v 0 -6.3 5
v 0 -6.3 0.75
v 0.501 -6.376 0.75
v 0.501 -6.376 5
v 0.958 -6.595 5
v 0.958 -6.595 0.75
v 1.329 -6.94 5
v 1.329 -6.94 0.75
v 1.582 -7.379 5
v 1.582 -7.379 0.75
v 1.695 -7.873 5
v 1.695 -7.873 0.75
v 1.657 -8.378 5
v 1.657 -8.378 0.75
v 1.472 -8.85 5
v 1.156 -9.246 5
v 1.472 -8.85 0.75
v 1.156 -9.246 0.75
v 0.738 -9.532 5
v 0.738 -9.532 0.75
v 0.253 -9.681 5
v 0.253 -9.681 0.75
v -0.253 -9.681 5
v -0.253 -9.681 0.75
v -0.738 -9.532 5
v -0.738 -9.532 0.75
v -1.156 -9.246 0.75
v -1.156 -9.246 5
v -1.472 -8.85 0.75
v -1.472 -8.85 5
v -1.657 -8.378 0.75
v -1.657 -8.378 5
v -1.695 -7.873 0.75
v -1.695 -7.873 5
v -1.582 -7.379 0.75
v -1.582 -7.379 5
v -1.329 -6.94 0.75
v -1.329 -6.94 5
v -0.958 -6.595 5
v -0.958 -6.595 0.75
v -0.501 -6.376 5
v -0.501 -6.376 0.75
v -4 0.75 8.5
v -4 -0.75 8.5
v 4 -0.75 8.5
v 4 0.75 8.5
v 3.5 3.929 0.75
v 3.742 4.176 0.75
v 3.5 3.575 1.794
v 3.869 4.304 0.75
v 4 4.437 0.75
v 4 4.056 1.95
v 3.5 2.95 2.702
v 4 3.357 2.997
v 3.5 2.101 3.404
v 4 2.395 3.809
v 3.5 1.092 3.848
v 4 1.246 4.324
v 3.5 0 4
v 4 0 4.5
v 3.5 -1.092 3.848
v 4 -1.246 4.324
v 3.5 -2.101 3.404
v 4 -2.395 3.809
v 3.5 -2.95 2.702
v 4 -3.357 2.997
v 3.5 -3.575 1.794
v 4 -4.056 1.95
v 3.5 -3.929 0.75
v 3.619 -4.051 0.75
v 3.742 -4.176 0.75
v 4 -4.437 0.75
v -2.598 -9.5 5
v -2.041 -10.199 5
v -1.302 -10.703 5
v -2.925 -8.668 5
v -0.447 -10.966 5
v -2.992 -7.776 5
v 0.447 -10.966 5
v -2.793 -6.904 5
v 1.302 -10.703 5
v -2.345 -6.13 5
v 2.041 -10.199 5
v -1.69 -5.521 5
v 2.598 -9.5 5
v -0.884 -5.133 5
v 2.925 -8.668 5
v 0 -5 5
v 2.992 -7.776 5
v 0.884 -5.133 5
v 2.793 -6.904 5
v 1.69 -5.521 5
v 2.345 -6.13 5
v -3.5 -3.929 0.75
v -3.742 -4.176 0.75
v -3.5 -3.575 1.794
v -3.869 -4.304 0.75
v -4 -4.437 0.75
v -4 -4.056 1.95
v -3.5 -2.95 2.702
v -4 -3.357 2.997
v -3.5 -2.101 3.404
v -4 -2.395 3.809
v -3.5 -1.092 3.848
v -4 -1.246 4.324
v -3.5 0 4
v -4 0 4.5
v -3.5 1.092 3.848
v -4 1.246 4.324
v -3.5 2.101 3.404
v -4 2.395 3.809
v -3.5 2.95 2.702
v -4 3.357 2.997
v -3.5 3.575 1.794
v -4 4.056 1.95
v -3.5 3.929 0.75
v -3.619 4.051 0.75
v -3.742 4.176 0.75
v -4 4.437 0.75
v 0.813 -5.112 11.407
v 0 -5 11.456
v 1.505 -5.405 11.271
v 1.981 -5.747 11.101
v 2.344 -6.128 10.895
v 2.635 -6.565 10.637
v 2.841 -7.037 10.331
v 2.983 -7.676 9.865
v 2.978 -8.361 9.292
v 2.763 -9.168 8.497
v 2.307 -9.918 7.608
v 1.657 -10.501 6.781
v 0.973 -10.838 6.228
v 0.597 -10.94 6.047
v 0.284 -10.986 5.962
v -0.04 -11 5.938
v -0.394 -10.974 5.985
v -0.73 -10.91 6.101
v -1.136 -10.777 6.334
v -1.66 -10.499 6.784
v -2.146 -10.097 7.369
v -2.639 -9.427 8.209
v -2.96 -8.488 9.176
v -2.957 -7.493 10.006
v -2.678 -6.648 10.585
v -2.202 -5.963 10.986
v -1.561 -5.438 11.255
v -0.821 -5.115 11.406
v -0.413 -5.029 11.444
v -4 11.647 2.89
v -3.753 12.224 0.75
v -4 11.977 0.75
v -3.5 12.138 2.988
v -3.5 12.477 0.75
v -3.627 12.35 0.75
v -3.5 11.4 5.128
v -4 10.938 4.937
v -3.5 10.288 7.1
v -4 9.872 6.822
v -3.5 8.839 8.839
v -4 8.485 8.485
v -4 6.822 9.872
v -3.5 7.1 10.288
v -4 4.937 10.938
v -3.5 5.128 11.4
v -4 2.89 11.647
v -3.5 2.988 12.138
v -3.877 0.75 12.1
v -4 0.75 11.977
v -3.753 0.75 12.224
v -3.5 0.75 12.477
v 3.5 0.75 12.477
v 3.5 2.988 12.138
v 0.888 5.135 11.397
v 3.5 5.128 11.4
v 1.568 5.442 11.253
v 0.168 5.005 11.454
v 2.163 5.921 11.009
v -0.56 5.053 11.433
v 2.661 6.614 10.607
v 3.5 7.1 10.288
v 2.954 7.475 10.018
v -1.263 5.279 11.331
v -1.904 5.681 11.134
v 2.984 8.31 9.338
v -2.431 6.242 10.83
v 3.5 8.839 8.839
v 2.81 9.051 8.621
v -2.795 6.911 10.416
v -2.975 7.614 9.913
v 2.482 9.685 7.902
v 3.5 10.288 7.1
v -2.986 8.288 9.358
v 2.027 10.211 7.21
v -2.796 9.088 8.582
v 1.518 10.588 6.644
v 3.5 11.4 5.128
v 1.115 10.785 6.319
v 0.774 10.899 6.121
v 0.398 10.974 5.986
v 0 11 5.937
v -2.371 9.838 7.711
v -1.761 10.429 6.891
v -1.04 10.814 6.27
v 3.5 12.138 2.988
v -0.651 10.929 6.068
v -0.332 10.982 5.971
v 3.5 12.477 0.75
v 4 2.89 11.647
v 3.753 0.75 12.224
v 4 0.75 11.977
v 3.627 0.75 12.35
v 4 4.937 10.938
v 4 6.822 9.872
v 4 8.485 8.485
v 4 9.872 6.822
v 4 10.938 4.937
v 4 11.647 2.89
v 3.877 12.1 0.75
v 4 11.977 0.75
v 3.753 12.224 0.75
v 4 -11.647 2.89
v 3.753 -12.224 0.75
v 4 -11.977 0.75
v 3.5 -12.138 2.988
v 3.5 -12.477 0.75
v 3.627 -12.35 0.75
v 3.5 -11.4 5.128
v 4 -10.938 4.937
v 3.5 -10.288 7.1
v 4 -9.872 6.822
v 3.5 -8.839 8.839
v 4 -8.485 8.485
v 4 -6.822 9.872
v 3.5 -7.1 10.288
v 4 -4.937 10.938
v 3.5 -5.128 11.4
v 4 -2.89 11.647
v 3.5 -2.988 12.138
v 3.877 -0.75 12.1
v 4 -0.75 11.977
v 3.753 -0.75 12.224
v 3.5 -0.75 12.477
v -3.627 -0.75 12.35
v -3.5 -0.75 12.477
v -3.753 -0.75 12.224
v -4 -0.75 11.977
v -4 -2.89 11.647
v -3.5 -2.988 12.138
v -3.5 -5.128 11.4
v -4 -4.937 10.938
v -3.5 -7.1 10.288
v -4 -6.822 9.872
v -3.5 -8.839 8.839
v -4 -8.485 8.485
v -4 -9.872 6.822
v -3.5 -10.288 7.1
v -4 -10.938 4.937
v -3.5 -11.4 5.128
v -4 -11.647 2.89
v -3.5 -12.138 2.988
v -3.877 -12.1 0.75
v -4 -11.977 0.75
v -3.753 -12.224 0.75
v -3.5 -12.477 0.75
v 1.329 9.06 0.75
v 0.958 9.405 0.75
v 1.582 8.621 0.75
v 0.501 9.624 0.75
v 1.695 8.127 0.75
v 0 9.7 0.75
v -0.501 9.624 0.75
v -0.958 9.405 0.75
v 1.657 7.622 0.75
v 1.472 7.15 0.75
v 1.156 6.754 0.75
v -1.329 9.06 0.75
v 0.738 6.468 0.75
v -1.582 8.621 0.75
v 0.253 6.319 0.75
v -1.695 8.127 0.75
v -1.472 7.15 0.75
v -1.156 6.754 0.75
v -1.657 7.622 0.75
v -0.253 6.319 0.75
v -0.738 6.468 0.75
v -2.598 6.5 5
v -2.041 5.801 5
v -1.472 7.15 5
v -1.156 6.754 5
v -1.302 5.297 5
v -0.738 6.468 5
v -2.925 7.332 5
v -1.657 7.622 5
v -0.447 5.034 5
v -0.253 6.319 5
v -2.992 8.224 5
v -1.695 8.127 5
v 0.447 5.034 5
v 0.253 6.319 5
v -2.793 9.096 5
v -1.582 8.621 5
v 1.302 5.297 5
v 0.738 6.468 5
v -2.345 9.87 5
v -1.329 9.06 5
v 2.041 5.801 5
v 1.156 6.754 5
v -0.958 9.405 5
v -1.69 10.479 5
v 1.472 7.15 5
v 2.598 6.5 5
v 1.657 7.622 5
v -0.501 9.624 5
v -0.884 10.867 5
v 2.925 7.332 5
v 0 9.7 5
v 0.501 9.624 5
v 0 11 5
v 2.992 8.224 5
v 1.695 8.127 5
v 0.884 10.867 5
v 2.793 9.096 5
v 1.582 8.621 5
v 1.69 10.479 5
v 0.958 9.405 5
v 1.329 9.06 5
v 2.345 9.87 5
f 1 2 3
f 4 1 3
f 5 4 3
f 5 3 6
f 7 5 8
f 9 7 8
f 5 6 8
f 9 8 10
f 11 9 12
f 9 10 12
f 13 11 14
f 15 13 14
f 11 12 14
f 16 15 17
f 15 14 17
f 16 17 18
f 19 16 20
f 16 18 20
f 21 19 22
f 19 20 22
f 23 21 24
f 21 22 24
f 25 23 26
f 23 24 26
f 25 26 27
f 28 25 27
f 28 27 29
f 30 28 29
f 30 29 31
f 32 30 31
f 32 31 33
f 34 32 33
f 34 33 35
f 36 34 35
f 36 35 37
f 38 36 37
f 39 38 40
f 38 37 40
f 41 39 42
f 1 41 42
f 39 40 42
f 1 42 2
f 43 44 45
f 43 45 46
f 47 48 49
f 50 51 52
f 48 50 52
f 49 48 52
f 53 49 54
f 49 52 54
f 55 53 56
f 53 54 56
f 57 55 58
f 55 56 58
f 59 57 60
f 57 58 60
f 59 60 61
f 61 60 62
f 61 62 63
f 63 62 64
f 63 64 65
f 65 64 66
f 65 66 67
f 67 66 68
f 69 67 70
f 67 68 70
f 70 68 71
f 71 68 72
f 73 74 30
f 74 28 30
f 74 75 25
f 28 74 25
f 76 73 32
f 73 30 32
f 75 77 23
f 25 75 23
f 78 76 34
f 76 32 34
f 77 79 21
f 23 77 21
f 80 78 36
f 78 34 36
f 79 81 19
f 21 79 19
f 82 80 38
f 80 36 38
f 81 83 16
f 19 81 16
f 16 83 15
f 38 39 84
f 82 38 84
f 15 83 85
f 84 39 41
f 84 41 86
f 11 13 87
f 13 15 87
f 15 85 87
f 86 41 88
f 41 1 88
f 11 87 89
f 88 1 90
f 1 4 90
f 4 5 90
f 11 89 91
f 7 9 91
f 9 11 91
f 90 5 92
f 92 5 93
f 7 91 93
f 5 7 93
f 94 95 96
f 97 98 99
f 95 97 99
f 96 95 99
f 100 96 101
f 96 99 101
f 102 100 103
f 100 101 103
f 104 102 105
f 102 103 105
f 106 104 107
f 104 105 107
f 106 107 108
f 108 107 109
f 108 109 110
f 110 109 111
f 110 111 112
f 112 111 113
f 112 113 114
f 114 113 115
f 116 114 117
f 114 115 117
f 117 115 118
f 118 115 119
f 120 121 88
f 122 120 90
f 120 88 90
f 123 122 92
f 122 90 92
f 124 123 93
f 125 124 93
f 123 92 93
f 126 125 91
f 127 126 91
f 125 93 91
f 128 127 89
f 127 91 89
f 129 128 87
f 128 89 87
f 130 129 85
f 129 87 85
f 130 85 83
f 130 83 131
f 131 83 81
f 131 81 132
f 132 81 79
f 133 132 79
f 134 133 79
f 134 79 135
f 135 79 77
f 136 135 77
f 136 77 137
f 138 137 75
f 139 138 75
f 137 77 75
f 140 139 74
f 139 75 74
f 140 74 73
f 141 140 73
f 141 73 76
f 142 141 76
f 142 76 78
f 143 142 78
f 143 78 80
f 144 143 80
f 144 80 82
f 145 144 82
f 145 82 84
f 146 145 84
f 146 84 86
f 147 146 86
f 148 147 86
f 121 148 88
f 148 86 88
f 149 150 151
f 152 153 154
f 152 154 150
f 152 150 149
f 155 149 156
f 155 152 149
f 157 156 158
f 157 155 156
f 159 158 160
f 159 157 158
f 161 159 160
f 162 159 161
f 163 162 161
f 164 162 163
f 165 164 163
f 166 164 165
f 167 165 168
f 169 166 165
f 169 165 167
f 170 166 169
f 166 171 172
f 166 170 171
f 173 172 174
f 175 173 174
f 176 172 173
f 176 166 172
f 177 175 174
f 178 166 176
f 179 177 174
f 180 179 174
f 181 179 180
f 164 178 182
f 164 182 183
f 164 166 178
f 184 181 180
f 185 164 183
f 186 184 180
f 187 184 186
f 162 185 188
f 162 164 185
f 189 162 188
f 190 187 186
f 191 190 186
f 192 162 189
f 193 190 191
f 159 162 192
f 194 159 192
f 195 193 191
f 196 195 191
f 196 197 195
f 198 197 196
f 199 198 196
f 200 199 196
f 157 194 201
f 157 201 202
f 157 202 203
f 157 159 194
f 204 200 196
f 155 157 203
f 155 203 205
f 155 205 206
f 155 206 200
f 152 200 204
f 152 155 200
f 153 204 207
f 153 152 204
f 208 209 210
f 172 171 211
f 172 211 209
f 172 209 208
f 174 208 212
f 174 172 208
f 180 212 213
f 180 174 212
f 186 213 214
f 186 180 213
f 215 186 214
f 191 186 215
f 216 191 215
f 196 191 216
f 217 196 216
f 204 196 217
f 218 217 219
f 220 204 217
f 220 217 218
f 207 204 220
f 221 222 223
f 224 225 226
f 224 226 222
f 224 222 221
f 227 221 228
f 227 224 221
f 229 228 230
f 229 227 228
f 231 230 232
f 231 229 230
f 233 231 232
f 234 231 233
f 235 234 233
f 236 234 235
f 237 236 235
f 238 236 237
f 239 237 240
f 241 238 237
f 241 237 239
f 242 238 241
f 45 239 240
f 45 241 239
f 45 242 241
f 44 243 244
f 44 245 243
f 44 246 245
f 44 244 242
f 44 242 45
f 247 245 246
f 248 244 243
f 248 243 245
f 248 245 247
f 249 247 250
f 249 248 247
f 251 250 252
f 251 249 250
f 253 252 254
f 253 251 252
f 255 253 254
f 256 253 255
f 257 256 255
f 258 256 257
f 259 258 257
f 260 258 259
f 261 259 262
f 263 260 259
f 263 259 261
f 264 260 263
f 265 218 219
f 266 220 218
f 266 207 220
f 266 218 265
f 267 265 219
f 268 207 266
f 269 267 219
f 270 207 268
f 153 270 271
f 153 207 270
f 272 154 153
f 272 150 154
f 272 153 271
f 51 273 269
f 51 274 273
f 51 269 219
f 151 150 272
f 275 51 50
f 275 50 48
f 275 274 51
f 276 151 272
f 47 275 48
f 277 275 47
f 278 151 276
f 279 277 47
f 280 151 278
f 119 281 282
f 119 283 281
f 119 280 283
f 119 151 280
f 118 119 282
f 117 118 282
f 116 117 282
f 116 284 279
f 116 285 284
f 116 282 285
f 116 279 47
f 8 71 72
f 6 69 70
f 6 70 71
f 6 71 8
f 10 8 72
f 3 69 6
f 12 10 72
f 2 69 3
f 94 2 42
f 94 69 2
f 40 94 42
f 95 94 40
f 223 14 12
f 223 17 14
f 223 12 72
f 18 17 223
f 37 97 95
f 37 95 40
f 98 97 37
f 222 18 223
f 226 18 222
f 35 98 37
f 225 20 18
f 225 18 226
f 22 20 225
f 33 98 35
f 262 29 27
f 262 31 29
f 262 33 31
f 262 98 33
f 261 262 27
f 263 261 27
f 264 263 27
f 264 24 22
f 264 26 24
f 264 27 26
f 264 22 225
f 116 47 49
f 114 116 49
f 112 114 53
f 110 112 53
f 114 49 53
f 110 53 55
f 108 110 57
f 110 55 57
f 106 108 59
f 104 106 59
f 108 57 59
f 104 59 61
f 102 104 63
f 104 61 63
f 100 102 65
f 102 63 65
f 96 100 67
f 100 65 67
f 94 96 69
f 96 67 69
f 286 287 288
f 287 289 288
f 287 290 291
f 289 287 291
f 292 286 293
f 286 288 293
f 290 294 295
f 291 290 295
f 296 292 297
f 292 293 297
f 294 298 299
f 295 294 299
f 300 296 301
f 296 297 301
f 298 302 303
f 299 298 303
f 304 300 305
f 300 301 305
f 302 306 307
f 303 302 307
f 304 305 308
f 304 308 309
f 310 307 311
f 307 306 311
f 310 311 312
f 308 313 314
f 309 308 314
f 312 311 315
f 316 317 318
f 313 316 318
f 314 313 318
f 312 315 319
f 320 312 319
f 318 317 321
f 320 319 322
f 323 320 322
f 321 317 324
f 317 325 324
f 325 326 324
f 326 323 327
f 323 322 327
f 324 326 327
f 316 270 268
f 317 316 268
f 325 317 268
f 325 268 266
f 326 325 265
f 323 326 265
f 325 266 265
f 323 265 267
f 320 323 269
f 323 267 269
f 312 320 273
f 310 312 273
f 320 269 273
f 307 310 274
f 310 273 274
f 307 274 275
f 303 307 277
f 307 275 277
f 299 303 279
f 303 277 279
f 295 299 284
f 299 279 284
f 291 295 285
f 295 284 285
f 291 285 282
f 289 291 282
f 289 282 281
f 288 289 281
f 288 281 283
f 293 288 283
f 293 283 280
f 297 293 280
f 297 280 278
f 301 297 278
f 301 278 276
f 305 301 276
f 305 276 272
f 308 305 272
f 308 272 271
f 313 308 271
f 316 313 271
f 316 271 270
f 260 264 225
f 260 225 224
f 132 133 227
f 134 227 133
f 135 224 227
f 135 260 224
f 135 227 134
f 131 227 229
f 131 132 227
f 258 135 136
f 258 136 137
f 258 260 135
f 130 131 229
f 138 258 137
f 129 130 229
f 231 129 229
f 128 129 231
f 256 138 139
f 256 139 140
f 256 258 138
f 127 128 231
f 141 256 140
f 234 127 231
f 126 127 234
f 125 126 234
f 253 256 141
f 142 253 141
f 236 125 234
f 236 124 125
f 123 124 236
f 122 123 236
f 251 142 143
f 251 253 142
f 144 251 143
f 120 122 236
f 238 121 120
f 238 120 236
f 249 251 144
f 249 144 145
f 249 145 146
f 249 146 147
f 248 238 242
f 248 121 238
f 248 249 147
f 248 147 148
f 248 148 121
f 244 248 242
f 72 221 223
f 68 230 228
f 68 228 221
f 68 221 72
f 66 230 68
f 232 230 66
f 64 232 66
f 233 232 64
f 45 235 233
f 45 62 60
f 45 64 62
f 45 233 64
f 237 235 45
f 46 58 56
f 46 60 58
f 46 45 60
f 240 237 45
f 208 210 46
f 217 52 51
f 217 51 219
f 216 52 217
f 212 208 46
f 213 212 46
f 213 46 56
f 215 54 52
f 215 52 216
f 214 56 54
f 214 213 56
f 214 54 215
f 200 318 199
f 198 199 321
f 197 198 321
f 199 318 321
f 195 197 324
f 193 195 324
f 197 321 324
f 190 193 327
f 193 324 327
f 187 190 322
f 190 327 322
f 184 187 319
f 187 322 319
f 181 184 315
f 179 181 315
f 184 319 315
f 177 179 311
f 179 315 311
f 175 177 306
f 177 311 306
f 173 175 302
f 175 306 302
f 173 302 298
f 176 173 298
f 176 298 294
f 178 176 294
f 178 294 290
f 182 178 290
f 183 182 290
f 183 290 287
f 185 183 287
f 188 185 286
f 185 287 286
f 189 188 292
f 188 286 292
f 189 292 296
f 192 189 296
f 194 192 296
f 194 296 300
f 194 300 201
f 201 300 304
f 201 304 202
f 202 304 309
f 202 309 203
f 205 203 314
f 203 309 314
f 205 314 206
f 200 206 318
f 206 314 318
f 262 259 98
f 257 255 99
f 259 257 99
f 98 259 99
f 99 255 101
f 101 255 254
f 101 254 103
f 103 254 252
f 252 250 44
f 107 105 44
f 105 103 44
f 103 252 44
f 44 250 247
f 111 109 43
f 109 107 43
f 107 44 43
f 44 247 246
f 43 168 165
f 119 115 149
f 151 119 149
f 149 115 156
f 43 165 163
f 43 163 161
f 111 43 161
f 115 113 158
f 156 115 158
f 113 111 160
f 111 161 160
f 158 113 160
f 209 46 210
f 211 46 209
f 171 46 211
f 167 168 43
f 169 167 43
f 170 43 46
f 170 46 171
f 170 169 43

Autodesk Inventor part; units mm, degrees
sketch "_____1" plane through (0, 0, 0) normal (0, 0, 1) x (1, 0, 0)
  line L0 (50, 0) -> (-50, 0)
  line L1 (-4, 12) -> (-4, 4.5)
  line L2 (-4, 4.5) -> (-3.5, 4)
  line L3 (-3.5, 4) -> (3.5, 4)
  line L4 (3.5, 4) -> (4, 4.5)
  line L5 (4, 4.5) -> (4, 12)
  line L6 (4, 12) -> (3.5, 12.5)
  line L7 (3.5, 12.5) -> (-3.5, 12.5)
  line L8 (-3.5, 12.5) -> (-4, 12)
revolve "Revolution1" add sketch "_____1" angle 180 about axis through (50, 0, 0) along (1, 0, 0)
sketch "_____2" plane through (0, 0, 0) normal (1, 0, 0) x (0, 0, -1)
  line L0 (-0.75, -25) -> (0.75, -25)
  line L1 (0.75, -25) -> (0.75, 25)
  line L2 (0.75, 25) -> (-0.75, 25)
  line L3 (-0.75, 25) -> (-0.75, -25)
extrude "Extrusion1" cut sketch "_____2" along normal mid plane 16
sketch "_____3" plane through (0, 0, 0) normal (1, 0, 0) x (0, 0, -1)
  line L0 (0, 8) -> (-17.5, 8)
  line L1 (-17.5, 8) -> (-17.5, 11)
  line L2 (-17.5, 11) -> (-5, 11)
  line L3 (-5, 11) -> (-5, 9.7)
  line L4 (-5, 9.7) -> (0, 9.7)
  line L5 (0, 9.7) -> (0, 8)
  line L6 (0, 8) -> (-17.5, 8)
revolve "Revolution2" cut sketch "_____3" angle 360 about axis through (0, 8, 0) along (0, 0, -1)
pattern_linear "Rectangular Pattern1" count 2 spacing 16 along (0, -1, 0) of "Revolution2"
sketch "_____5" plane through (0, 0, 0) normal (1, 0, 0) x (0, 0, -1)
  line L0 (-12.5, -0.75) -> (-8.5, -0.75)
  line L1 (-8.5, -0.75) -> (-8.5, 0.75)
  line L2 (-8.5, 0.75) -> (-12.5, 0.75)
  line L3 (-12.5, 0.75) -> (-12.5, -0.75)
extrude "Extrusion2" cut sketch "_____5" along normal mid plane 16
ref_plane "to_body_XY" through (0, 0, 0) normal (0, 0, -1) x (1, 0, 0)
ref_plane "to_body_YZ" through (0, 0, 0) normal (1, 0, 0) x (0, -1, 0)
ref_plane "to_body_ZX" through (0, 0, 0) normal (0, -1, 0) x (0, 0, -1)
ref_plane "to_bolt_1_XY" through (0, 8, 5) normal (0, 0, 1) x (1, 0, 0)
ref_plane "to_bolt_1_YZ" through (0, 8, 5) normal (1, 0, 0) x (0, 1, 0)
ref_plane "to_bolt_1_ZX" through (0, 8, 5) normal (0, 1, 0) x (0, 0, 1)
ref_plane "to_bolt_2_XY" through (0, -8, 5) normal (0, 0, 1) x (1, 0, 0)
ref_plane "to_bolt_2_YZ" through (0, -8, 5) normal (1, 0, 0) x (0, 1, 0)
ref_plane "to_bolt_2_ZX" through (0, -8, 5) normal (0, 1, 0) x (0, 0, 1)
properties part number "C-SCNPAW8-8_1"
